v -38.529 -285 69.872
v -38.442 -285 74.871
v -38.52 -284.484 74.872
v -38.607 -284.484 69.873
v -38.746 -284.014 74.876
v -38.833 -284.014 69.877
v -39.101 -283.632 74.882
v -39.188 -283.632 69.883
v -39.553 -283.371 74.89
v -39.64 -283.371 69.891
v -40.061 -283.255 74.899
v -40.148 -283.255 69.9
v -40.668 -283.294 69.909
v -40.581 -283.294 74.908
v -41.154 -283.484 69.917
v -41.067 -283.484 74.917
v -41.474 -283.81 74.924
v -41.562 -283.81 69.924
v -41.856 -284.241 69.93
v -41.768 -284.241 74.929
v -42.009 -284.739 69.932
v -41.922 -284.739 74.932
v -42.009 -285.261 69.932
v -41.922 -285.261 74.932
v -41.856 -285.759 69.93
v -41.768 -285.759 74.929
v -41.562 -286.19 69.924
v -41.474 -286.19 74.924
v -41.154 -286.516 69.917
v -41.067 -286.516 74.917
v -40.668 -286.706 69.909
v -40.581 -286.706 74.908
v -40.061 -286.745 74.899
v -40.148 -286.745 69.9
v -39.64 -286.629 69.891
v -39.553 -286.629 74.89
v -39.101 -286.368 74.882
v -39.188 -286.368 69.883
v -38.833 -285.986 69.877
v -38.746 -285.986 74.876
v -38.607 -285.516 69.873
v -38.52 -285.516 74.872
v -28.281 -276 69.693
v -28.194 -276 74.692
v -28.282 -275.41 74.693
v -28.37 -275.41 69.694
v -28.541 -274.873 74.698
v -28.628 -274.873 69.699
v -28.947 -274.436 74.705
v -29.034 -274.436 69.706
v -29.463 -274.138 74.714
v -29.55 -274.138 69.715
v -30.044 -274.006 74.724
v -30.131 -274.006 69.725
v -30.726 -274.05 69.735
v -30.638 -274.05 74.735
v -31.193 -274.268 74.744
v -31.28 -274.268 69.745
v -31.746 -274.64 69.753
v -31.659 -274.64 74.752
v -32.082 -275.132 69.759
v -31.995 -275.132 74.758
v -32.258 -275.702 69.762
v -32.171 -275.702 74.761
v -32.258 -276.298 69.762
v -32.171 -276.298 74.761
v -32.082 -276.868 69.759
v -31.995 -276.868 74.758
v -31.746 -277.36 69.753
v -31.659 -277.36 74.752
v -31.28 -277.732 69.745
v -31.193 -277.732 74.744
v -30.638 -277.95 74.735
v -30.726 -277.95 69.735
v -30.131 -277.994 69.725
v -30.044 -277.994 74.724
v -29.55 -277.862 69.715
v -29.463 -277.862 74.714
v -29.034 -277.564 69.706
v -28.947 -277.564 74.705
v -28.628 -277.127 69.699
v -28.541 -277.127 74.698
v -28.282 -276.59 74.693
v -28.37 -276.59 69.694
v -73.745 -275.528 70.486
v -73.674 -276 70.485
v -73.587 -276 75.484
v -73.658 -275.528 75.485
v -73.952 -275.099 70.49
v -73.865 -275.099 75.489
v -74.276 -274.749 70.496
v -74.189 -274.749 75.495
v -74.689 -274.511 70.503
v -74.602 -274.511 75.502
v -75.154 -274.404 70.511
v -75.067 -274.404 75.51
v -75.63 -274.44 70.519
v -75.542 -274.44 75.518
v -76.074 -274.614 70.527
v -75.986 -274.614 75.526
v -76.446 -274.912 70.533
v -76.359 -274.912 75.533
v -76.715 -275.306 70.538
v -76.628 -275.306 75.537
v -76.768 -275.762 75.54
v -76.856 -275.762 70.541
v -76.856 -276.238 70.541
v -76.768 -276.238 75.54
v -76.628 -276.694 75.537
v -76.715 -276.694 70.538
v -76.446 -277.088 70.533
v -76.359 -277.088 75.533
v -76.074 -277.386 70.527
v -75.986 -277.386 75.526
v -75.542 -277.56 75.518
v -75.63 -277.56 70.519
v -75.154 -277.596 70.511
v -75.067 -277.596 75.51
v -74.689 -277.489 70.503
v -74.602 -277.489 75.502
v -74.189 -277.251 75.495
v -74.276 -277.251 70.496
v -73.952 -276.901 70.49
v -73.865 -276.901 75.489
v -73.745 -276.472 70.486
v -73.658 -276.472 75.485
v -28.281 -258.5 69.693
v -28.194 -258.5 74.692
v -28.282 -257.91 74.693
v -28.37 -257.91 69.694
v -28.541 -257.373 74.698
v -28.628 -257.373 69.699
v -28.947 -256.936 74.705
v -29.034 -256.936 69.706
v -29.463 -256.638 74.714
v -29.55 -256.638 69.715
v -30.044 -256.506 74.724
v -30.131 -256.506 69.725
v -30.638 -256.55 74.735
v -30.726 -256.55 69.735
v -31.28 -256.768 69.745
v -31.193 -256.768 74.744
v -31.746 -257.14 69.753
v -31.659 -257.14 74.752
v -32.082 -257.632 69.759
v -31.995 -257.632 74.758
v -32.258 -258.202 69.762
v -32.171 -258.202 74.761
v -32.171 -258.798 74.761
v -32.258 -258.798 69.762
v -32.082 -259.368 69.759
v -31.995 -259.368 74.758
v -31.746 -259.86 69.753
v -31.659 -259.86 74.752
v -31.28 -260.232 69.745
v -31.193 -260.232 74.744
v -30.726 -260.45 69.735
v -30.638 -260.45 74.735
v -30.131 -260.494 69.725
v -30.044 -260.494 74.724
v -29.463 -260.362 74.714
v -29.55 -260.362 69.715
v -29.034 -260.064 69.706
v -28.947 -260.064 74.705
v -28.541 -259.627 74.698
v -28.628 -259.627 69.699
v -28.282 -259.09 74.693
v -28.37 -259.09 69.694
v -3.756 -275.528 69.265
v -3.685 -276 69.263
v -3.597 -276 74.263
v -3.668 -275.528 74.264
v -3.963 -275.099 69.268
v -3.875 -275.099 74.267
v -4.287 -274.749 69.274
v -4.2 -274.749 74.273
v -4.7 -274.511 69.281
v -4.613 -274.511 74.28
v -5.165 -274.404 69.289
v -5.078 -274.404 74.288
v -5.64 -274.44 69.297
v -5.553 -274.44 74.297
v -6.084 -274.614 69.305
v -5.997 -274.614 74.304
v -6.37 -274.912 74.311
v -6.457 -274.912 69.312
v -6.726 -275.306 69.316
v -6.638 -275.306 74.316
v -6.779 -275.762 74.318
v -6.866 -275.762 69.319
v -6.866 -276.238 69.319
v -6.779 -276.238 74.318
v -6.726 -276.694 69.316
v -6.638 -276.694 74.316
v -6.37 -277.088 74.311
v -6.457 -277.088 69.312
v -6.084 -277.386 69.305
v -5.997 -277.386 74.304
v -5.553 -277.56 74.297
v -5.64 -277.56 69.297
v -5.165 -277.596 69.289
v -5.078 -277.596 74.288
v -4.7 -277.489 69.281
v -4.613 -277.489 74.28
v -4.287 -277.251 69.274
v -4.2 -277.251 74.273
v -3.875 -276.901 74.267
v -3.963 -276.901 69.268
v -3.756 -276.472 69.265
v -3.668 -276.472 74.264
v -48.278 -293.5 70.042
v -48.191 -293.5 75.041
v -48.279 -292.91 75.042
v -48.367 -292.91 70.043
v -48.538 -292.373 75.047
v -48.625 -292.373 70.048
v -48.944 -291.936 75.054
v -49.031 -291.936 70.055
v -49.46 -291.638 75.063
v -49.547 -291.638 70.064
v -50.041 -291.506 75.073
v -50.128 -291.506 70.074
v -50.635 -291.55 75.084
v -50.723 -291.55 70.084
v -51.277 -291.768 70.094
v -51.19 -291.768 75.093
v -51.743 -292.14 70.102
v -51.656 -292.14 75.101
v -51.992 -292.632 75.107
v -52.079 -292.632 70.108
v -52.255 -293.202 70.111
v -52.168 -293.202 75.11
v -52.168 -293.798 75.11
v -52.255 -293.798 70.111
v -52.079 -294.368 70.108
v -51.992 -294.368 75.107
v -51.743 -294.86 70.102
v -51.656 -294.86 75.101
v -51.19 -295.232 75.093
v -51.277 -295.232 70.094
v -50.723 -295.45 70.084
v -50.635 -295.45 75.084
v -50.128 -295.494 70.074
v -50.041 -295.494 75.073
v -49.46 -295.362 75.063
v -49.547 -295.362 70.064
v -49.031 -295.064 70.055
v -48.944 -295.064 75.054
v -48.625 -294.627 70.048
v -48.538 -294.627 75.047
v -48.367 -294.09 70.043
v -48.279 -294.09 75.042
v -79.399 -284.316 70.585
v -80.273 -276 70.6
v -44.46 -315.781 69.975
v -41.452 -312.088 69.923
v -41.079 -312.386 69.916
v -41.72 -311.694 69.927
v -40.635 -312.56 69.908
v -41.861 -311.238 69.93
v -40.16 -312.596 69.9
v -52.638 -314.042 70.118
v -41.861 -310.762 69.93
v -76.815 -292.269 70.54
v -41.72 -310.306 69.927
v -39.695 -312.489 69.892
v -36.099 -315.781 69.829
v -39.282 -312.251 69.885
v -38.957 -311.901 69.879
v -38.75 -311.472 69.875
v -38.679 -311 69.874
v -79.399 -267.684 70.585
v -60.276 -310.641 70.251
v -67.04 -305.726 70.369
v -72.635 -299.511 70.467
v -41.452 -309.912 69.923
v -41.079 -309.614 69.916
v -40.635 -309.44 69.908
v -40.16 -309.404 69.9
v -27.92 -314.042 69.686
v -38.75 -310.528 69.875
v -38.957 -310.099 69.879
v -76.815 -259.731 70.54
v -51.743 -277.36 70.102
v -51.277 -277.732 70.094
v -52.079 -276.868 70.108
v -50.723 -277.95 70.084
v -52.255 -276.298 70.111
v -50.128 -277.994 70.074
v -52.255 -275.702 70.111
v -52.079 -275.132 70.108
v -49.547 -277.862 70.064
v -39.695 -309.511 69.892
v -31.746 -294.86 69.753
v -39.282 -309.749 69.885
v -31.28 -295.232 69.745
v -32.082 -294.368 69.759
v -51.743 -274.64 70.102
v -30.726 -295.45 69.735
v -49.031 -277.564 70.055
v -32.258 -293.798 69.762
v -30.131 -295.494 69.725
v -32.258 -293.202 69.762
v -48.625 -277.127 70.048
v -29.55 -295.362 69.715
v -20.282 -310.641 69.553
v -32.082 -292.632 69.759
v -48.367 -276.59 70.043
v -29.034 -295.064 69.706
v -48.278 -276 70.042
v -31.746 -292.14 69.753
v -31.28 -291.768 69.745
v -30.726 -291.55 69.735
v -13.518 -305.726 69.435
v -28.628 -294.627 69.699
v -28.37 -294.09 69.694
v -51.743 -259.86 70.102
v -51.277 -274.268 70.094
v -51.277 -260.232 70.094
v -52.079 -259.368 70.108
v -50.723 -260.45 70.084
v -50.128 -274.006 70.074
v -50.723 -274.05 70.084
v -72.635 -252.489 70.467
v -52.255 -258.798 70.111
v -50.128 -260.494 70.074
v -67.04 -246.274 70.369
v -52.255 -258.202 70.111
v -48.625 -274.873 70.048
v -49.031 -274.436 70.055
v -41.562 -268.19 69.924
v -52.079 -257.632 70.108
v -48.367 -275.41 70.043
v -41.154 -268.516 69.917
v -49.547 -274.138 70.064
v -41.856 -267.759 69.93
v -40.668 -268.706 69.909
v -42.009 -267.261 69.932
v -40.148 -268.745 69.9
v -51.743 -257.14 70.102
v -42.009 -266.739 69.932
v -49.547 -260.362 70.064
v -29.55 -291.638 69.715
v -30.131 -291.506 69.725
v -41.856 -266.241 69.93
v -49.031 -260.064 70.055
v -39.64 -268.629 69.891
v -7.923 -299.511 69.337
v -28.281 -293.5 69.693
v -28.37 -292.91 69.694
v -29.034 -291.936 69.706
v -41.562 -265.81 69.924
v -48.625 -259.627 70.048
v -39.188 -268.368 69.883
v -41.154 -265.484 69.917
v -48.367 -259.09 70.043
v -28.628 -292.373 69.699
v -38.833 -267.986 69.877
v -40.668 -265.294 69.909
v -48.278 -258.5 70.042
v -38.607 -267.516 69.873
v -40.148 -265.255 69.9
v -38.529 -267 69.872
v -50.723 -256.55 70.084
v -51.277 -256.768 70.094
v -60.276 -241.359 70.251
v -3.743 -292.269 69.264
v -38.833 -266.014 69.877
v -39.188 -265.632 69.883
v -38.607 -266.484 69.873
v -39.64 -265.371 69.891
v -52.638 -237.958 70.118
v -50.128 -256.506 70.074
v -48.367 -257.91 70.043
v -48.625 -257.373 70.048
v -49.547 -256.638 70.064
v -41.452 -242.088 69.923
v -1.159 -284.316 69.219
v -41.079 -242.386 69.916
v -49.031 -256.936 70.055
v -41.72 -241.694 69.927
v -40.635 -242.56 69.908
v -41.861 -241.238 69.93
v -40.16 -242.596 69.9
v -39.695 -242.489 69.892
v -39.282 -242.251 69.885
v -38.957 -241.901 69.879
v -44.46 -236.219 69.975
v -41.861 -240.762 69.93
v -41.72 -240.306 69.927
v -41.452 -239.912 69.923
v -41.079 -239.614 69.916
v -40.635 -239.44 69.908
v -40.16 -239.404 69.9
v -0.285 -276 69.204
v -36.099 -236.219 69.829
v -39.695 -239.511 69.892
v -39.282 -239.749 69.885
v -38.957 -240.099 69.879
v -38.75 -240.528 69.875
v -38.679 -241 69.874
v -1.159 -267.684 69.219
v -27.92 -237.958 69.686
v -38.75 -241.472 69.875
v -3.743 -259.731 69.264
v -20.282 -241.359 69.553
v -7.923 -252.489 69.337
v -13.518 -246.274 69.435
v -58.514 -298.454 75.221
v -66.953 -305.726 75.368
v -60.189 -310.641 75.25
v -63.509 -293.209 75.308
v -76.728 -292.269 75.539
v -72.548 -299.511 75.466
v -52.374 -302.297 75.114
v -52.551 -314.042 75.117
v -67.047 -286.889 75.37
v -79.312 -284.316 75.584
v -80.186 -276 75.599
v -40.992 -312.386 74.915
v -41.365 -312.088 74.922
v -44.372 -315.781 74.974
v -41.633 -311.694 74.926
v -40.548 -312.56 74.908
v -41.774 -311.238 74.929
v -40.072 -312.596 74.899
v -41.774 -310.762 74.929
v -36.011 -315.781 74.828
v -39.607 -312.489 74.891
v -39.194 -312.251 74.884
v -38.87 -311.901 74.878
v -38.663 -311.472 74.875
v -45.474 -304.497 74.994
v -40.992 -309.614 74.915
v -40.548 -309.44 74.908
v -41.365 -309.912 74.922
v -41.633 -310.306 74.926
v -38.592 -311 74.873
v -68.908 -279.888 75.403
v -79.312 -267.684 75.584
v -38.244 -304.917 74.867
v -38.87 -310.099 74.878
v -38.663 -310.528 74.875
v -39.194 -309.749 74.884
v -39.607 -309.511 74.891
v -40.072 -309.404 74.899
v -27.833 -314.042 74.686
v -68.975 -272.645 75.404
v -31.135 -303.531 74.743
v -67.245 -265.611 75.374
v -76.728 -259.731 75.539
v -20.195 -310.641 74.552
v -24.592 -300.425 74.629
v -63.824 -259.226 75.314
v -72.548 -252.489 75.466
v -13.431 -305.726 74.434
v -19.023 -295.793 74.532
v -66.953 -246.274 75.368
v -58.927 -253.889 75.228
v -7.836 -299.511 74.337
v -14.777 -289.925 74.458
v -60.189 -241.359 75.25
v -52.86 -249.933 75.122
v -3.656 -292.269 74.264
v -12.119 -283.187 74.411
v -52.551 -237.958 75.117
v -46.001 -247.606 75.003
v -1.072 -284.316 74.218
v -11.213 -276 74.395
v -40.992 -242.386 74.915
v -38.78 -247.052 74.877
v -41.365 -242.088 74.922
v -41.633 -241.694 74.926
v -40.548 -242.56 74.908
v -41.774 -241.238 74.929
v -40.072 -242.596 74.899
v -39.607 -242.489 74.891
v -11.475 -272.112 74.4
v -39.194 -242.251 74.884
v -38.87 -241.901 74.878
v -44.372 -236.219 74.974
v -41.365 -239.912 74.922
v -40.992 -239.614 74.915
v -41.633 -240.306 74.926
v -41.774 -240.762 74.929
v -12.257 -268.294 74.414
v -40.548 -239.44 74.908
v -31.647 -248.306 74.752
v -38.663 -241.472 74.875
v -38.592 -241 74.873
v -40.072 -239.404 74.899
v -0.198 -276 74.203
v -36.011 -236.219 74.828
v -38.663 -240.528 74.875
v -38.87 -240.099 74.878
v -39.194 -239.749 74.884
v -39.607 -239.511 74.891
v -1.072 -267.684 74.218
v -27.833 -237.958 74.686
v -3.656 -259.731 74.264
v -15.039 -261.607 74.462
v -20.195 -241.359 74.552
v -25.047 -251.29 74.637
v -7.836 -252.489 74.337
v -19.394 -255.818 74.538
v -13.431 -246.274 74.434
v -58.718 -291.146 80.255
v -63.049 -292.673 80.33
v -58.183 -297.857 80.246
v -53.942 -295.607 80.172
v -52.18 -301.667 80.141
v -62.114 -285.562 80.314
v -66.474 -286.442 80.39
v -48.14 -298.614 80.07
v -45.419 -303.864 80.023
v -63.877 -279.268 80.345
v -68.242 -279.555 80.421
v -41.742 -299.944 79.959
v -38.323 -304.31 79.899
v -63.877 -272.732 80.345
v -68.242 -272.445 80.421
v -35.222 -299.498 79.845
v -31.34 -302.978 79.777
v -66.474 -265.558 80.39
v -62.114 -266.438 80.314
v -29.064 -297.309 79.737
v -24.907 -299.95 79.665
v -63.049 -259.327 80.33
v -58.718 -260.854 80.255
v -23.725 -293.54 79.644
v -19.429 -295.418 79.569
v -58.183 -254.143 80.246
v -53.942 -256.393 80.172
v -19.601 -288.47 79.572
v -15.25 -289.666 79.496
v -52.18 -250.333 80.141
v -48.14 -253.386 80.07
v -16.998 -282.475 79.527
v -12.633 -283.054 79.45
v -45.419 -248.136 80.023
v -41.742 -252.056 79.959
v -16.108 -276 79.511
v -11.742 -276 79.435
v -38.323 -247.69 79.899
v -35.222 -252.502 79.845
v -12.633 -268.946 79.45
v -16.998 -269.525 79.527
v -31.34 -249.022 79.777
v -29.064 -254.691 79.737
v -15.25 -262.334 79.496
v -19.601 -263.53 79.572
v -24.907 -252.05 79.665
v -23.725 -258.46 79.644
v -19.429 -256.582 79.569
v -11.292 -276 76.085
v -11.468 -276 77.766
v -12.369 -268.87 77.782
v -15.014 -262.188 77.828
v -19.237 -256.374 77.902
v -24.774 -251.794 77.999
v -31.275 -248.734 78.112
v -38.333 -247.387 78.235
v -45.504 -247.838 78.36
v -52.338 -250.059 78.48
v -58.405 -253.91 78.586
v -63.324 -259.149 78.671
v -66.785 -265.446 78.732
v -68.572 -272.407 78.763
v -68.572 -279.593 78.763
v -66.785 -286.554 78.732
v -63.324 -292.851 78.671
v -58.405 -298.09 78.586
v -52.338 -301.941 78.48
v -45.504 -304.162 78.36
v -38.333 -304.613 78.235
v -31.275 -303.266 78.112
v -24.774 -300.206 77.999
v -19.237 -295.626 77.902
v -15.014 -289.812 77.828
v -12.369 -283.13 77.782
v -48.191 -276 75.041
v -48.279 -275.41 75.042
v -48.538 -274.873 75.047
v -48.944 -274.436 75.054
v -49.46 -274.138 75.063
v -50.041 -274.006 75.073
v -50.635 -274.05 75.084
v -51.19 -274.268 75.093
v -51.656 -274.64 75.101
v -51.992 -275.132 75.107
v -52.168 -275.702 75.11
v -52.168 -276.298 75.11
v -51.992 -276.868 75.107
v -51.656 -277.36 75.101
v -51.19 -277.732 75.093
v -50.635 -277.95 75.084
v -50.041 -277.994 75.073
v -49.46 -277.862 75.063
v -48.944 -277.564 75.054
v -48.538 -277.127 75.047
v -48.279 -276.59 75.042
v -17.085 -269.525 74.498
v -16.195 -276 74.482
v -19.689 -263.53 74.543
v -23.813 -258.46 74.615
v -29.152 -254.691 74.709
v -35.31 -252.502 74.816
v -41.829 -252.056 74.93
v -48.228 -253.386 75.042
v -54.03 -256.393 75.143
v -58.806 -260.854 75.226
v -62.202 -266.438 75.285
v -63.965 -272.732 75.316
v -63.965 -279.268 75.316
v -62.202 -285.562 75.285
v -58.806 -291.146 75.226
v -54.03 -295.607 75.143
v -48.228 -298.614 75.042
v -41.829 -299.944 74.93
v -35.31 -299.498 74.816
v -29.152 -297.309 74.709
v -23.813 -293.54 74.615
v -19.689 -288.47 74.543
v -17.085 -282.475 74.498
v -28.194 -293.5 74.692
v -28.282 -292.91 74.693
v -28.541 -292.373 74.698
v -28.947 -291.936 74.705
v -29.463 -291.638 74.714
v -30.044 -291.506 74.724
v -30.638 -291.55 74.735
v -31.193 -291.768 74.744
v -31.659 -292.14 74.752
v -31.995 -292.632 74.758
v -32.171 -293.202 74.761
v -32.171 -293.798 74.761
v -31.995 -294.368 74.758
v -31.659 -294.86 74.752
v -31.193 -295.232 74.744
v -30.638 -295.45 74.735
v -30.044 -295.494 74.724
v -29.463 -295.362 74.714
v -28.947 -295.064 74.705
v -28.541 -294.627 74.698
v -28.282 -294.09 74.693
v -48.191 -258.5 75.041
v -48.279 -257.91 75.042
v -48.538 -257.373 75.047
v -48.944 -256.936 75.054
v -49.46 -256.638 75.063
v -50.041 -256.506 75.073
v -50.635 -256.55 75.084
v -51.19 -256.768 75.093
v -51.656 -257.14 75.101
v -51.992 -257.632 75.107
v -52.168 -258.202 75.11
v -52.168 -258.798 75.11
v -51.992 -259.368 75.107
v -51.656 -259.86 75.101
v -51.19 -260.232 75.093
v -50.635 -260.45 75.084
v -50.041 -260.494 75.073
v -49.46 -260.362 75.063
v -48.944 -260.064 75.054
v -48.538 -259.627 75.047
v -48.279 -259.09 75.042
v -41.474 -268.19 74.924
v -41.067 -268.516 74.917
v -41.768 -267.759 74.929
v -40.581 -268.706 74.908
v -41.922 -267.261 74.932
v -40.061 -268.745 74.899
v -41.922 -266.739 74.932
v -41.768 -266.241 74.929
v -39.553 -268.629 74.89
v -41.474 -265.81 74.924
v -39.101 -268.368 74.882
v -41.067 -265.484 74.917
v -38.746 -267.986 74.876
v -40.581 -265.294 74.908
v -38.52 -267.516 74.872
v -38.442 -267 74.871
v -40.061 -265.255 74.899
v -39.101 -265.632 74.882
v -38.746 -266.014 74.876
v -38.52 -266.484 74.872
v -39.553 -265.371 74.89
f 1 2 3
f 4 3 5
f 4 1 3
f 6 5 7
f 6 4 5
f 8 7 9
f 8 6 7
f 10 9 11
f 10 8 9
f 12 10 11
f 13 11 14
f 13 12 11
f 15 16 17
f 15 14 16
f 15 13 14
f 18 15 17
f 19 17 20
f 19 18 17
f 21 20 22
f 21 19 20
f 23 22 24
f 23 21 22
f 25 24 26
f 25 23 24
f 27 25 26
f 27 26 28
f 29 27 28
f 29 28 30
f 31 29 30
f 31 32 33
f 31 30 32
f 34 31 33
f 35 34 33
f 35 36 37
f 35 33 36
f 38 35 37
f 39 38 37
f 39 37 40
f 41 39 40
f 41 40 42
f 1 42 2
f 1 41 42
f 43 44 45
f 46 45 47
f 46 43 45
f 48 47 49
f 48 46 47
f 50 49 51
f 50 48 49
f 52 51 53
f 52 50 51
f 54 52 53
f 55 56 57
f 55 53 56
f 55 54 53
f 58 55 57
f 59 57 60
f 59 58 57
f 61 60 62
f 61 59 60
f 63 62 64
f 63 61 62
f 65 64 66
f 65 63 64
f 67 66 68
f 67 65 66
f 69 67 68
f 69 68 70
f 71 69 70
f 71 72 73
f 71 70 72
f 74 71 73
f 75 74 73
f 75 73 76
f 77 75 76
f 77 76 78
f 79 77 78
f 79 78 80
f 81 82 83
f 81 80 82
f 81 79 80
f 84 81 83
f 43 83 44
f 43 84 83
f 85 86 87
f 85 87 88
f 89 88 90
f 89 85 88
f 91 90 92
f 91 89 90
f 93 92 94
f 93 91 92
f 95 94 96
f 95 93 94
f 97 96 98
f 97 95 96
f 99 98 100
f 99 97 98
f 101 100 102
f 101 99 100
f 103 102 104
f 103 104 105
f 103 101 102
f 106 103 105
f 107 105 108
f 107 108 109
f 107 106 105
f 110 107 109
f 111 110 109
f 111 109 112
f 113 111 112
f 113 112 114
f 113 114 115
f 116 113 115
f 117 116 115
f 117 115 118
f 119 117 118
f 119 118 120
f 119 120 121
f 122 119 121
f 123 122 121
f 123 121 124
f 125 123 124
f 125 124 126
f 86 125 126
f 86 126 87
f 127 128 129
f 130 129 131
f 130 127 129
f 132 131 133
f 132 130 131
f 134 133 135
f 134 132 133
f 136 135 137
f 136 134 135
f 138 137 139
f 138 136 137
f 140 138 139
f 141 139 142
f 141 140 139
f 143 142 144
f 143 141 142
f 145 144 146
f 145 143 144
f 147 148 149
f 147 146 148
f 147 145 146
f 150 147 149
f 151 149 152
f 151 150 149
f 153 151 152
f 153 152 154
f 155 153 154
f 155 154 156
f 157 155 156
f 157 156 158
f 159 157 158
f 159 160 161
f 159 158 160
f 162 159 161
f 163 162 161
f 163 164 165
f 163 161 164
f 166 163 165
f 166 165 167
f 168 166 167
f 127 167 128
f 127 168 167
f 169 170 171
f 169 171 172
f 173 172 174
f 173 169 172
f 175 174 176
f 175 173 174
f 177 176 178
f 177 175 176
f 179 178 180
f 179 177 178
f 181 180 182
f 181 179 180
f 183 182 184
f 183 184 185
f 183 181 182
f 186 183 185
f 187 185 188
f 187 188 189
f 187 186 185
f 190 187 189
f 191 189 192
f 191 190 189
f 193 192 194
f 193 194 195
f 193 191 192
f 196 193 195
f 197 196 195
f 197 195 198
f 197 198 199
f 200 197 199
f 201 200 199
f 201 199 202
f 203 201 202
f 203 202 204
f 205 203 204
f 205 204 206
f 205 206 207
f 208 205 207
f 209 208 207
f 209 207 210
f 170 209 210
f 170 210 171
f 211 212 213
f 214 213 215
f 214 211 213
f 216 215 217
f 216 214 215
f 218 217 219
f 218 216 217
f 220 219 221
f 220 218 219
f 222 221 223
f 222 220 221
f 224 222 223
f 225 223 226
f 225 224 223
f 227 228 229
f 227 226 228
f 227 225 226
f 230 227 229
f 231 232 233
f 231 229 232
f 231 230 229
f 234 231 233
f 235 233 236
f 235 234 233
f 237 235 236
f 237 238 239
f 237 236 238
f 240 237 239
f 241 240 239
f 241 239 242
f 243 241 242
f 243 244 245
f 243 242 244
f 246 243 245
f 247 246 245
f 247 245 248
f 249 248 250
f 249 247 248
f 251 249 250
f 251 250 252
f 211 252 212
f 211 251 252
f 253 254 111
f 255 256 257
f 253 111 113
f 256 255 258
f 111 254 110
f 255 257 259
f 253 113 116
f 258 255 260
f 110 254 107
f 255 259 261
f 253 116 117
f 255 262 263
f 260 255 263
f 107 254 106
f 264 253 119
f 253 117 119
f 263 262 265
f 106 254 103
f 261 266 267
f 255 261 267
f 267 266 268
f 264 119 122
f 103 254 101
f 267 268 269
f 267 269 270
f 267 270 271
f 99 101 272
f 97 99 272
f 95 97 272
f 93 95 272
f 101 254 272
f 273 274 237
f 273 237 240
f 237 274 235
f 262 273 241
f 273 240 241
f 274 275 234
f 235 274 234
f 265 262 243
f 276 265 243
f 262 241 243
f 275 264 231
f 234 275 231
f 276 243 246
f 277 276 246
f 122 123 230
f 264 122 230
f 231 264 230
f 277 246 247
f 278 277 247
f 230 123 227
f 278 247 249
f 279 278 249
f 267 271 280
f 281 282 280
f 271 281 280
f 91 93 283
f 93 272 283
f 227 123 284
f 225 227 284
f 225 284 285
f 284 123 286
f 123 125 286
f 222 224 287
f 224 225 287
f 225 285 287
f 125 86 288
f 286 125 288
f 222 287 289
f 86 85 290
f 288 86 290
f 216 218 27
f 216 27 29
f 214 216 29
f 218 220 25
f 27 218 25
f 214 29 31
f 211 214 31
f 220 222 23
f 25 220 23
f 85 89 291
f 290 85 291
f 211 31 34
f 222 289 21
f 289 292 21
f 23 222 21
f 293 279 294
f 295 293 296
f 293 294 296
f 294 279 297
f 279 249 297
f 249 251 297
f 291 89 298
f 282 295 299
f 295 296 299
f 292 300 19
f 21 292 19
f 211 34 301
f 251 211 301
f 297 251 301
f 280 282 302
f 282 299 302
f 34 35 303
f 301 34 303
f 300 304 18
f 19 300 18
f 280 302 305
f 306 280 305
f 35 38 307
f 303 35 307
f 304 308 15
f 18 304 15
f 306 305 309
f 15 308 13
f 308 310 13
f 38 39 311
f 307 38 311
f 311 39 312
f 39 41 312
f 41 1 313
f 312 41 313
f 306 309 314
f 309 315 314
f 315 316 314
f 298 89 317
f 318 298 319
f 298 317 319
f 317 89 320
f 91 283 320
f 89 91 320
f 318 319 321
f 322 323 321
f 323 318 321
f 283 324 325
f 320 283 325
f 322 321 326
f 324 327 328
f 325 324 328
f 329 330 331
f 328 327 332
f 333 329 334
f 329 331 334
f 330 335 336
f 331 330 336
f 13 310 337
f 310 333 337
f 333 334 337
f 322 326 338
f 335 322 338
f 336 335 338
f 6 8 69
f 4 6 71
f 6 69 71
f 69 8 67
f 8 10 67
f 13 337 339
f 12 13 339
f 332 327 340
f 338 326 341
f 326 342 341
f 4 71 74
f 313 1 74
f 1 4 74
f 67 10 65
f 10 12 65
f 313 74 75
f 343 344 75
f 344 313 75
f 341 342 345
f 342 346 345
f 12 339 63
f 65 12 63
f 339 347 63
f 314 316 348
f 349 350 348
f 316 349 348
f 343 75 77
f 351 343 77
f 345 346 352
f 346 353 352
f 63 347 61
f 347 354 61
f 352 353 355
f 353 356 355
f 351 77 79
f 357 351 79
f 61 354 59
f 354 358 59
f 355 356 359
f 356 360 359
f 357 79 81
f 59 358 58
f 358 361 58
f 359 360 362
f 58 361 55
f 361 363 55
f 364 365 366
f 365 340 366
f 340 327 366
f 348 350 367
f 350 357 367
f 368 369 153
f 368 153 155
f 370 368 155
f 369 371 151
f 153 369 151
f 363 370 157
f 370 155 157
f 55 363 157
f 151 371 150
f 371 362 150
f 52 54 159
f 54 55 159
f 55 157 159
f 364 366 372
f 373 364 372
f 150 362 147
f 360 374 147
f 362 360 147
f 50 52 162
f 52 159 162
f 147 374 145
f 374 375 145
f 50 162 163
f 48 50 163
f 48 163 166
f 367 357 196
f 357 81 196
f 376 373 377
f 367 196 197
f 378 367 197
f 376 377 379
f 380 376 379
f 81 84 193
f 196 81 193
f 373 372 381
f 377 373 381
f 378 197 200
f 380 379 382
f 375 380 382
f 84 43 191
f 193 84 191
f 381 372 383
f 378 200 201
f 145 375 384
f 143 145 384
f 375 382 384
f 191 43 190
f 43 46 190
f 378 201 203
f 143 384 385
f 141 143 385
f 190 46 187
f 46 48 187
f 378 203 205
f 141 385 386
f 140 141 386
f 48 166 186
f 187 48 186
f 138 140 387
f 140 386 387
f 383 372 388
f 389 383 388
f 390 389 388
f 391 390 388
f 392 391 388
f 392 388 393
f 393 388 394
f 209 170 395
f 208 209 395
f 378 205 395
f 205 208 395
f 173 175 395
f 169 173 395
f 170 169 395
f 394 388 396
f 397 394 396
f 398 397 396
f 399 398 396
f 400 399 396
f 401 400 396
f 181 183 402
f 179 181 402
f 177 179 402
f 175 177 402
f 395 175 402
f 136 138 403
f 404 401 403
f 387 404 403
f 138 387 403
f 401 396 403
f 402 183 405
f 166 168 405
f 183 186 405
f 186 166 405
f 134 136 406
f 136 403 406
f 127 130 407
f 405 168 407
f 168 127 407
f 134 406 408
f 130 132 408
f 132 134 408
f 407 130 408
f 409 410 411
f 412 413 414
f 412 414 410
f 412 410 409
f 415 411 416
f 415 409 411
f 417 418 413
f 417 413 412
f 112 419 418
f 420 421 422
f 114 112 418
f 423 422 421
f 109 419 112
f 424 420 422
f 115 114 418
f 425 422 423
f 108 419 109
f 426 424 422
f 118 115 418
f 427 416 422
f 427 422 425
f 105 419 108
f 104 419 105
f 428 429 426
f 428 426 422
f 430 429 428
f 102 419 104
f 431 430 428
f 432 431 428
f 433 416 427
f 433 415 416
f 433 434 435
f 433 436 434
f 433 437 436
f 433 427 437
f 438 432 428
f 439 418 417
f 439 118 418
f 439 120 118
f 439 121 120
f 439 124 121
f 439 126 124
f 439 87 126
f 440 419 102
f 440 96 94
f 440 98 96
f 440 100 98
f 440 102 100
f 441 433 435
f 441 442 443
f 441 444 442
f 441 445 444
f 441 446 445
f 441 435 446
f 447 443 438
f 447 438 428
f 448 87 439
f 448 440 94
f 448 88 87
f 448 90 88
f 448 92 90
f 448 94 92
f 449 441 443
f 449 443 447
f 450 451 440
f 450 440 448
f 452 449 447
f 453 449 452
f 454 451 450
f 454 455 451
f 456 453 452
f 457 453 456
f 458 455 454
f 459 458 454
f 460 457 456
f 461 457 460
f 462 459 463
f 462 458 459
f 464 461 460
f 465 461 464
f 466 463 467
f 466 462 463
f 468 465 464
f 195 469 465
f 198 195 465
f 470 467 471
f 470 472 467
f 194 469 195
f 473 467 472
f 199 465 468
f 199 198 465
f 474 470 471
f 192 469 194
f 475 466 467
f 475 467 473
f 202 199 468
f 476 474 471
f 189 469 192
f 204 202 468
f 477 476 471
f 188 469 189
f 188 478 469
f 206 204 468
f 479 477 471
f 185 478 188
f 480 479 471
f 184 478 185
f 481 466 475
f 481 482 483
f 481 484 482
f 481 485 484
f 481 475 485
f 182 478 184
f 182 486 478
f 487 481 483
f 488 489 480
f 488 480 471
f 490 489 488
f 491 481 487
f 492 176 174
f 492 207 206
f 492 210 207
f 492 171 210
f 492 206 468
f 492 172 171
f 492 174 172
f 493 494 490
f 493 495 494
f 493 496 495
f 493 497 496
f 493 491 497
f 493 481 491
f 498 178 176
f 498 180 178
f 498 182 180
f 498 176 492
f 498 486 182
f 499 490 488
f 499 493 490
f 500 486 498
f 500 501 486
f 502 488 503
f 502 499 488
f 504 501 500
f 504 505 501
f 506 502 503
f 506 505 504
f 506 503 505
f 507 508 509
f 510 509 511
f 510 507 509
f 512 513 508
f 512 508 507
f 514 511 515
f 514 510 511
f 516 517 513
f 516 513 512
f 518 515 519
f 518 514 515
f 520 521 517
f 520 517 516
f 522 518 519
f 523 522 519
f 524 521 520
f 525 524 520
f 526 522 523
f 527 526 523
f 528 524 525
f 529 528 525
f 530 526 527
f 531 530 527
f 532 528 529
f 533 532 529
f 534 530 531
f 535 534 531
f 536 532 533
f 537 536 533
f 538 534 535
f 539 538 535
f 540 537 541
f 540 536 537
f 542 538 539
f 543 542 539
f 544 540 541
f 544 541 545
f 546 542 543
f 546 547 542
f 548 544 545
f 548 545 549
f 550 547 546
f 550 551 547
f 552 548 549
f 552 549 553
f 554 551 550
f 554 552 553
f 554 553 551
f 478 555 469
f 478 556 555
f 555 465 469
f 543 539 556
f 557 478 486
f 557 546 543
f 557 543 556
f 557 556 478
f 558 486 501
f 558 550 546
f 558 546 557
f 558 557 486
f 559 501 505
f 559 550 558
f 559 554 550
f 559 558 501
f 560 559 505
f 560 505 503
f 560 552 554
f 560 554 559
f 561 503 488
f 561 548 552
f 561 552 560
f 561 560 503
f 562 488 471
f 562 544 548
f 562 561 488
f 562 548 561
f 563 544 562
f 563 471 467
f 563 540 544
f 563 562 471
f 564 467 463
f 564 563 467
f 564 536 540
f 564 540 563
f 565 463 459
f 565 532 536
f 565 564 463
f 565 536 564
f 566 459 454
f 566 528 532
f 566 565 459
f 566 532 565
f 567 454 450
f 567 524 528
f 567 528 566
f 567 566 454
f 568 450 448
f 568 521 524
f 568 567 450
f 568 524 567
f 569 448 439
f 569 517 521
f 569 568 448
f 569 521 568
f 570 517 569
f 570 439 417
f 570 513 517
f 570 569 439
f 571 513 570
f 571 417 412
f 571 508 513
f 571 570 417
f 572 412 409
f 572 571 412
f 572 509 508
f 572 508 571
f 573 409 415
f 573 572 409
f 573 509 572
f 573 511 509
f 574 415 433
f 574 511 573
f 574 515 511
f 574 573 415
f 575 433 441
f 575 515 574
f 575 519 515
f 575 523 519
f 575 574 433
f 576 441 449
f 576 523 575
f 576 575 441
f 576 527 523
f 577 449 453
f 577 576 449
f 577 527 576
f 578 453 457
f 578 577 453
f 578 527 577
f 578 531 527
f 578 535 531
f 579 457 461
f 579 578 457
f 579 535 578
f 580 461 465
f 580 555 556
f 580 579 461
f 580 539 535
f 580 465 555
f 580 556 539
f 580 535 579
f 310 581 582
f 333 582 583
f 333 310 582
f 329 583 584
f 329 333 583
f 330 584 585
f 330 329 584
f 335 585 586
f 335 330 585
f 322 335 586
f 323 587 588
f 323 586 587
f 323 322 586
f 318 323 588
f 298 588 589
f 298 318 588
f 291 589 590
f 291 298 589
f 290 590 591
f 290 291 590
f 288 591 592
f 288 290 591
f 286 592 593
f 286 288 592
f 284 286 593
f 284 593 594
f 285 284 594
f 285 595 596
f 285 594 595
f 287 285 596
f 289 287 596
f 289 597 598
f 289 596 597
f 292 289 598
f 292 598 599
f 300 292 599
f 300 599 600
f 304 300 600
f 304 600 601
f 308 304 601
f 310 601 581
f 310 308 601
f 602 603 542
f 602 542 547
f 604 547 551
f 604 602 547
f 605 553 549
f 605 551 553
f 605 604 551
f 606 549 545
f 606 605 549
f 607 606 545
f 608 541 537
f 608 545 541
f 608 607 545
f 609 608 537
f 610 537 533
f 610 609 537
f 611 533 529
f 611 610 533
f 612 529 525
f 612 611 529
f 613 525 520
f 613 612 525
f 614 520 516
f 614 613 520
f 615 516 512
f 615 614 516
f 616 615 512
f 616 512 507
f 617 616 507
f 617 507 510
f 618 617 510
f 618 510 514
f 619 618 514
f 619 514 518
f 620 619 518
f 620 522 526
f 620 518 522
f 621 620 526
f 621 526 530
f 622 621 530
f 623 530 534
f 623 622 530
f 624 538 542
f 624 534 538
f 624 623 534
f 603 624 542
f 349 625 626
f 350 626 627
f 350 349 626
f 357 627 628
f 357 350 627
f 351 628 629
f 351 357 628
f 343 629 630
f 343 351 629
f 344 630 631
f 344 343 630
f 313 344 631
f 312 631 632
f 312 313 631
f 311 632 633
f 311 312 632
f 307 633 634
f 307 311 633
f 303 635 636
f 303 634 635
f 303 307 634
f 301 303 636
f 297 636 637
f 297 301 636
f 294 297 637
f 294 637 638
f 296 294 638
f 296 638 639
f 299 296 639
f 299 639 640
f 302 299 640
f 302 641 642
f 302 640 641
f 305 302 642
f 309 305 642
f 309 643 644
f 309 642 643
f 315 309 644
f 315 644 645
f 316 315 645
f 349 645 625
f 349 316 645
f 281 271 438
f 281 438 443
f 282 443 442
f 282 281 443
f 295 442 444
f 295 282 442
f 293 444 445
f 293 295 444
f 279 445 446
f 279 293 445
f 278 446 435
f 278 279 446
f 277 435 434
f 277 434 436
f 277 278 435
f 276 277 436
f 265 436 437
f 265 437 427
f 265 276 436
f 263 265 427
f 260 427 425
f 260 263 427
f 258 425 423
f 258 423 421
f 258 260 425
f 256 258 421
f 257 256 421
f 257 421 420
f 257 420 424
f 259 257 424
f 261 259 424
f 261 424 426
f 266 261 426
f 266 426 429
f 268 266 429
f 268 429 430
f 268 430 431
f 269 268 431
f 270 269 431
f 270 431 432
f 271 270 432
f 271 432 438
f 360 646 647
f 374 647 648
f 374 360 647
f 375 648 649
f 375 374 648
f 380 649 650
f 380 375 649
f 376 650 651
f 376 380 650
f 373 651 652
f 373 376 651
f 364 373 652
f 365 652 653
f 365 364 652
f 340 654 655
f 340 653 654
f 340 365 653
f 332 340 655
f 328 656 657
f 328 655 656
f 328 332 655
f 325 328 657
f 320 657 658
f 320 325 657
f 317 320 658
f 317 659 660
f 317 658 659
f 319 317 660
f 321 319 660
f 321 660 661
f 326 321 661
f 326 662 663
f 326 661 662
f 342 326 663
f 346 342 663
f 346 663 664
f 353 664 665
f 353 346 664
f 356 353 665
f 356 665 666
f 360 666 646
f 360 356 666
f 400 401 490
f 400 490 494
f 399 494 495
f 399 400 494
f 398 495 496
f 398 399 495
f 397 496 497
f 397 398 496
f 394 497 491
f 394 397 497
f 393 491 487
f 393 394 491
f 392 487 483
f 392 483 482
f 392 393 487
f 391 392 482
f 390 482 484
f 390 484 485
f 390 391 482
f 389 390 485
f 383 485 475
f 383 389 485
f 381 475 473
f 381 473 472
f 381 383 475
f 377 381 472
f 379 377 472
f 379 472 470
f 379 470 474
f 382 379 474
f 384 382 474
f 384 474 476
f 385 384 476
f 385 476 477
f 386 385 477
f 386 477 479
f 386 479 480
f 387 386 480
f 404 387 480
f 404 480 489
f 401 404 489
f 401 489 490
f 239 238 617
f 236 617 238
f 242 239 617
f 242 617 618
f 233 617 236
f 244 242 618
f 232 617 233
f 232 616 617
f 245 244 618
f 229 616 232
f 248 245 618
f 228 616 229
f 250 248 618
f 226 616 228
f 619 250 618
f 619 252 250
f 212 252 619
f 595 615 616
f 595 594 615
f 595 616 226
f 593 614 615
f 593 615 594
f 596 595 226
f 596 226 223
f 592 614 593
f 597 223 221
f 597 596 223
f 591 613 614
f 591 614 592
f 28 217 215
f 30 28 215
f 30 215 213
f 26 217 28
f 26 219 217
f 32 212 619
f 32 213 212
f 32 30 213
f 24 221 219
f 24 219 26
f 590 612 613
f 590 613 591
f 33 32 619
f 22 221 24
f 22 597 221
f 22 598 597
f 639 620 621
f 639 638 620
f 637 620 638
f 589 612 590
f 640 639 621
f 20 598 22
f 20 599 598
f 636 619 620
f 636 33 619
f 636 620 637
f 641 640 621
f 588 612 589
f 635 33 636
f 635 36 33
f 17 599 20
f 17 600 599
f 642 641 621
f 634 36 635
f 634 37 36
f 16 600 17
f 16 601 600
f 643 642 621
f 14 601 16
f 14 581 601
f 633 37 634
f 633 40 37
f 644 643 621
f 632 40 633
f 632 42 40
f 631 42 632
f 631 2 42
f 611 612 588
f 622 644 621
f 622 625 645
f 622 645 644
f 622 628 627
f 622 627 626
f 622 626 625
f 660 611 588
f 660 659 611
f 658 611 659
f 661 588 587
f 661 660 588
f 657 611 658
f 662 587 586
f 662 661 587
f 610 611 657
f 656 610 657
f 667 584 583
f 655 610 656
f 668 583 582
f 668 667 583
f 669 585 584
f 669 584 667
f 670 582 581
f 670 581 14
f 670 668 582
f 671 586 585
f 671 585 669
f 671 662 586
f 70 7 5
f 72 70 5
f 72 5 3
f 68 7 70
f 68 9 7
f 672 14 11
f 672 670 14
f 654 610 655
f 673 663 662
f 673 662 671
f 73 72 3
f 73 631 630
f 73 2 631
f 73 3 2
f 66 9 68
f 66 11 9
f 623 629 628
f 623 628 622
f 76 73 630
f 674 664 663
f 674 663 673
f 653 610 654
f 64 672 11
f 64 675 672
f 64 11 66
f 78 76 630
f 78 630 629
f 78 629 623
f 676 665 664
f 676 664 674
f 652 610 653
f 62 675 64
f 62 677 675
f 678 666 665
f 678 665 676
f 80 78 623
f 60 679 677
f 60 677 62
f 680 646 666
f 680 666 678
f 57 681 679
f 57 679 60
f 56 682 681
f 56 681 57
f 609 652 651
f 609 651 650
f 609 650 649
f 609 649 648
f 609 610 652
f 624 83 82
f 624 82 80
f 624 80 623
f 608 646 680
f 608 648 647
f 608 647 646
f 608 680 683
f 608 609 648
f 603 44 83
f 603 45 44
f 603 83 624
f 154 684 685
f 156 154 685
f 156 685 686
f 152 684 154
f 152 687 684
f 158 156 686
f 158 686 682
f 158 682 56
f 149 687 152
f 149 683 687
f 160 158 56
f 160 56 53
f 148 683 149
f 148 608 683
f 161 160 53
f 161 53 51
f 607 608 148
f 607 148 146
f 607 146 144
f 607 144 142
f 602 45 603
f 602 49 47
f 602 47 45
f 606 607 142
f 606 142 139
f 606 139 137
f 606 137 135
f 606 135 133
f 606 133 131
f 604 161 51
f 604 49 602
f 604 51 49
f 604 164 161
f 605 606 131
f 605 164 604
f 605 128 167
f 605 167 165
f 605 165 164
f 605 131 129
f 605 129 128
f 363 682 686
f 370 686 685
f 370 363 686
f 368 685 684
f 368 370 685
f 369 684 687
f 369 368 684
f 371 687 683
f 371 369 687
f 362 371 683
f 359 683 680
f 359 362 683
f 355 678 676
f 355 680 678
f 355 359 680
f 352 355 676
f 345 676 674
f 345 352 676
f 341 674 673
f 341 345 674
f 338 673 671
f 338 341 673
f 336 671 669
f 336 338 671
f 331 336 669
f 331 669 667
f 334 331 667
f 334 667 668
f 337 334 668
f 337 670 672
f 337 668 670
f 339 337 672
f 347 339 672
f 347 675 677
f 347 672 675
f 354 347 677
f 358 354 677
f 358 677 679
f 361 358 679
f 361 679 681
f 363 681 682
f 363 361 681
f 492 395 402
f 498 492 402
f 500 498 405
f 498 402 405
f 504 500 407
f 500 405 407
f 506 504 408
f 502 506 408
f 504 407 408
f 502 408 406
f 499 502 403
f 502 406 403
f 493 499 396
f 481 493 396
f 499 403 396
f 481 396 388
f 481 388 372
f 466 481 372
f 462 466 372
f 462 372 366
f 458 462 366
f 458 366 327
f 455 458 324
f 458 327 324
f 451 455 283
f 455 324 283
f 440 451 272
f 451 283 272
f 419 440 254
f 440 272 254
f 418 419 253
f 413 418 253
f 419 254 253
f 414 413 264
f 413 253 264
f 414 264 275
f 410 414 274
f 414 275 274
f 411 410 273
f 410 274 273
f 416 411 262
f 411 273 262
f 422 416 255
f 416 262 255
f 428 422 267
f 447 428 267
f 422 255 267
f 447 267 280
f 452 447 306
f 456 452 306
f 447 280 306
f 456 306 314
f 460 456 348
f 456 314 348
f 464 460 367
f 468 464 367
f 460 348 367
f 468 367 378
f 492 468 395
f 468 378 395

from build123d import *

# Parameters (mm, degrees)
CYLINDER115_R          = 1.6
CYLINDER115_DEPTH      = 10
CYLINDER116_R          = 1.6
CYLINDER116_DEPTH      = 10
CYLINDER117_R          = 1.6
CYLINDER117_DEPTH      = 10
CYLINDER114_R          = 1.6
CYLINDER114_DEPTH      = 10
CYLINDER111_R          = 2
CYLINDER111_DEPTH      = 10
CYLINDER110_R          = 2
CYLINDER110_DEPTH      = 10
CYLINDER113_R          = 1.75
CYLINDER113_DEPTH      = 10
CYLINDER112_R          = 1.75
CYLINDER112_DEPTH      = 10
CYLINDER104_R          = 2
CYLINDER104_DEPTH      = 10
CYLINDER105_R          = 2
CYLINDER105_DEPTH      = 10
CYLINDER106_R          = 2
CYLINDER106_DEPTH      = 10
CYLINDER107_R          = 2
CYLINDER107_DEPTH      = 10
CYLINDER109_R          = 24
CYLINDER109_DEPTH      = 7
CYLINDER108_R          = 40
CYLINDER108_DEPTH      = 5
CUT014_PLACEMENT_ANGLE = 1


with BuildPart() as m2heatsetinsets013:
    # Cylinder115 → Cylinder115 (new body)
    with BuildSketch(Plane(origin=(40, 0, 65), x_dir=(1, 0, 0), z_dir=(0, 0, 1))):
        Circle(CYLINDER115_R)
    extrude(amount=CYLINDER115_DEPTH)


with BuildPart() as m2heatsetinsets014:
    # Cylinder116 → Cylinder116 (new body)
    with BuildSketch(Plane(origin=(5, 35, 65), x_dir=(1, 0, 0), z_dir=(0, 0, 1))):
        Circle(CYLINDER116_R)
    extrude(amount=CYLINDER116_DEPTH)


with BuildPart() as m2heatsetinsets015:
    # Cylinder117 → Cylinder117 (new body)
    with BuildSketch(Plane(origin=(5, -35, 65), x_dir=(1, 0, 0), z_dir=(0, 0, 1))):
        Circle(CYLINDER117_R)
    extrude(amount=CYLINDER117_DEPTH)


with BuildPart() as fusion037:
    # Cylinder114 → Cylinder114 (new body)
    with BuildSketch(Plane(origin=(-30, 0, 65), x_dir=(1, 0, 0), z_dir=(0, 0, 1))):
        Circle(CYLINDER114_R)
    extrude(amount=CYLINDER114_DEPTH)

    # Fusion037: union m2HeatSetInsets013, m2HeatSetInsets014, m2HeatSetInsets015
    add(m2heatsetinsets013.part)
    add(m2heatsetinsets014.part)
    add(m2heatsetinsets015.part)


with BuildPart() as wirecut007:
    # Cylinder111 → Cylinder111 (new body)
    with BuildSketch(Plane(origin=(15, 0, 70), x_dir=(1, 0, 0), z_dir=(0, 0, 1))):
        Circle(CYLINDER111_R)
    extrude(amount=CYLINDER111_DEPTH)


with BuildPart() as wirecuts003:
    # Cylinder110 → Cylinder110 (new body)
    with BuildSketch(Plane(origin=(-5, 0, 70), x_dir=(1, 0, 0), z_dir=(0, 0, 1))):
        Circle(CYLINDER110_R)
    extrude(amount=CYLINDER110_DEPTH)

    # Fusion033: union wireCUt007
    add(wirecut007.part)


with BuildPart() as m3cuts007:
    # Cylinder113 → Cylinder113 (new body)
    with BuildSketch(Plane(origin=(5, 9, 70), x_dir=(1, 0, 0), z_dir=(0, 0, 1))):
        Circle(CYLINDER113_R)
    extrude(amount=CYLINDER113_DEPTH)


with BuildPart() as m3cute003:
    # Cylinder112 → Cylinder112 (new body)
    with BuildSketch(Plane(origin=(5, -9, 70), x_dir=(1, 0, 0), z_dir=(0, 0, 1))):
        Circle(CYLINDER112_R)
    extrude(amount=CYLINDER112_DEPTH)

    # Fusion034: union m3Cuts007
    add(m3cuts007.part)


with BuildPart() as cylinder104:
    # Cylinder104 → Cylinder104 (new body)
    with BuildSketch(Plane(origin=(0, -21, 0), x_dir=(1, 0, 0), z_dir=(0, 0, 1))):
        Circle(CYLINDER104_R)
    extrude(amount=CYLINDER104_DEPTH)


with BuildPart() as m3heatsetcuts009:
    # Cylinder105 → Cylinder105 (new body)
    with BuildSketch(Plane(origin=(20, -21, 0), x_dir=(1, 0, 0), z_dir=(0, 0, 1))):
        Circle(CYLINDER105_R)
    extrude(amount=CYLINDER105_DEPTH)

    # Fusion030: union Cylinder104
    add(cylinder104.part)


with BuildPart() as m3heatsetcuts009_1:
    # Fusion030 placement: moved
    add(m3heatsetcuts009.part.moved(Location((-5, 38.5, 70))))


with BuildPart() as cylinder106:
    # Cylinder106 → Cylinder106 (new body)
    with BuildSketch(Plane(origin=(0, -21, 0), x_dir=(1, 0, 0), z_dir=(0, 0, 1))):
        Circle(CYLINDER106_R)
    extrude(amount=CYLINDER106_DEPTH)


with BuildPart() as basecuts003:
    # Cylinder107 → Cylinder107 (new body)
    with BuildSketch(Plane(origin=(20, -21, 0), x_dir=(1, 0, 0), z_dir=(0, 0, 1))):
        Circle(CYLINDER107_R)
    extrude(amount=CYLINDER107_DEPTH)

    # Fusion031: union Cylinder106
    add(cylinder106.part)


with BuildPart() as basecuts003_1:
    # Fusion031 placement: moved
    add(basecuts003.part.moved(Location((-5, 3.5, 70))))

    # Fusion032: union m3HeatSetCuts009
    add(m3heatsetcuts009_1.part)

    # Fusion035: union wireCuts003, m3Cute003
    add(wirecuts003.part)
    add(m3cute003.part)


with BuildPart() as basecut003:
    # Cylinder109 → Cylinder109 (new body)
    with BuildSketch(Plane(origin=(5, 0, 74), x_dir=(1, 0, 0), z_dir=(0, 0, 1))):
        Circle(CYLINDER109_R)
    extrude(amount=CYLINDER109_DEPTH)


with BuildPart() as cut012:
    # Sphere004 → Sphere004 (revolve)
    with BuildSketch(Plane(origin=(5, 0, 74), x_dir=(1, 0, 0), z_dir=(0, -1, 0))):
        with BuildLine():
            ThreePointArc((29, 0), (28.841135, 3.031325), (28.36628, 6.029439))
            Line((28.36628, 6.029439), (0, 6.029439))
            Line((0, 6.029439), (0, 0))
            Line((0, 0), (29, 0))
        make_face()
    revolve(axis=Axis((5, 0, 74), (0, 0, 1)))

    # Cut012: cut baseCut003
    add(basecut003.part, mode=Mode.SUBTRACT)


with BuildPart() as lightmodule003:
    # Cylinder108 → Cylinder108 (new body)
    with BuildSketch(Plane(origin=(5, 0, 70), x_dir=(1, 0, 0), z_dir=(0, 0, 1))):
        Circle(CYLINDER108_R)
    extrude(amount=CYLINDER108_DEPTH)

    # Fusion036: union Cut012
    add(cut012.part)

    # Cut013: cut baseCUts003
    add(basecuts003_1.part, mode=Mode.SUBTRACT)

    # Cut014: cut Fusion037
    add(fusion037.part, mode=Mode.SUBTRACT)


with BuildPart() as lightmodule003_1:
    # Cut014 placement: moved
    add(lightmodule003.part.moved(Location((-46.5, -276, 0))).rotate(Axis((-46.5, -276, 0), (0, 1, 0)), CUT014_PLACEMENT_ANGLE))


solid = lightmodule003_1.part
